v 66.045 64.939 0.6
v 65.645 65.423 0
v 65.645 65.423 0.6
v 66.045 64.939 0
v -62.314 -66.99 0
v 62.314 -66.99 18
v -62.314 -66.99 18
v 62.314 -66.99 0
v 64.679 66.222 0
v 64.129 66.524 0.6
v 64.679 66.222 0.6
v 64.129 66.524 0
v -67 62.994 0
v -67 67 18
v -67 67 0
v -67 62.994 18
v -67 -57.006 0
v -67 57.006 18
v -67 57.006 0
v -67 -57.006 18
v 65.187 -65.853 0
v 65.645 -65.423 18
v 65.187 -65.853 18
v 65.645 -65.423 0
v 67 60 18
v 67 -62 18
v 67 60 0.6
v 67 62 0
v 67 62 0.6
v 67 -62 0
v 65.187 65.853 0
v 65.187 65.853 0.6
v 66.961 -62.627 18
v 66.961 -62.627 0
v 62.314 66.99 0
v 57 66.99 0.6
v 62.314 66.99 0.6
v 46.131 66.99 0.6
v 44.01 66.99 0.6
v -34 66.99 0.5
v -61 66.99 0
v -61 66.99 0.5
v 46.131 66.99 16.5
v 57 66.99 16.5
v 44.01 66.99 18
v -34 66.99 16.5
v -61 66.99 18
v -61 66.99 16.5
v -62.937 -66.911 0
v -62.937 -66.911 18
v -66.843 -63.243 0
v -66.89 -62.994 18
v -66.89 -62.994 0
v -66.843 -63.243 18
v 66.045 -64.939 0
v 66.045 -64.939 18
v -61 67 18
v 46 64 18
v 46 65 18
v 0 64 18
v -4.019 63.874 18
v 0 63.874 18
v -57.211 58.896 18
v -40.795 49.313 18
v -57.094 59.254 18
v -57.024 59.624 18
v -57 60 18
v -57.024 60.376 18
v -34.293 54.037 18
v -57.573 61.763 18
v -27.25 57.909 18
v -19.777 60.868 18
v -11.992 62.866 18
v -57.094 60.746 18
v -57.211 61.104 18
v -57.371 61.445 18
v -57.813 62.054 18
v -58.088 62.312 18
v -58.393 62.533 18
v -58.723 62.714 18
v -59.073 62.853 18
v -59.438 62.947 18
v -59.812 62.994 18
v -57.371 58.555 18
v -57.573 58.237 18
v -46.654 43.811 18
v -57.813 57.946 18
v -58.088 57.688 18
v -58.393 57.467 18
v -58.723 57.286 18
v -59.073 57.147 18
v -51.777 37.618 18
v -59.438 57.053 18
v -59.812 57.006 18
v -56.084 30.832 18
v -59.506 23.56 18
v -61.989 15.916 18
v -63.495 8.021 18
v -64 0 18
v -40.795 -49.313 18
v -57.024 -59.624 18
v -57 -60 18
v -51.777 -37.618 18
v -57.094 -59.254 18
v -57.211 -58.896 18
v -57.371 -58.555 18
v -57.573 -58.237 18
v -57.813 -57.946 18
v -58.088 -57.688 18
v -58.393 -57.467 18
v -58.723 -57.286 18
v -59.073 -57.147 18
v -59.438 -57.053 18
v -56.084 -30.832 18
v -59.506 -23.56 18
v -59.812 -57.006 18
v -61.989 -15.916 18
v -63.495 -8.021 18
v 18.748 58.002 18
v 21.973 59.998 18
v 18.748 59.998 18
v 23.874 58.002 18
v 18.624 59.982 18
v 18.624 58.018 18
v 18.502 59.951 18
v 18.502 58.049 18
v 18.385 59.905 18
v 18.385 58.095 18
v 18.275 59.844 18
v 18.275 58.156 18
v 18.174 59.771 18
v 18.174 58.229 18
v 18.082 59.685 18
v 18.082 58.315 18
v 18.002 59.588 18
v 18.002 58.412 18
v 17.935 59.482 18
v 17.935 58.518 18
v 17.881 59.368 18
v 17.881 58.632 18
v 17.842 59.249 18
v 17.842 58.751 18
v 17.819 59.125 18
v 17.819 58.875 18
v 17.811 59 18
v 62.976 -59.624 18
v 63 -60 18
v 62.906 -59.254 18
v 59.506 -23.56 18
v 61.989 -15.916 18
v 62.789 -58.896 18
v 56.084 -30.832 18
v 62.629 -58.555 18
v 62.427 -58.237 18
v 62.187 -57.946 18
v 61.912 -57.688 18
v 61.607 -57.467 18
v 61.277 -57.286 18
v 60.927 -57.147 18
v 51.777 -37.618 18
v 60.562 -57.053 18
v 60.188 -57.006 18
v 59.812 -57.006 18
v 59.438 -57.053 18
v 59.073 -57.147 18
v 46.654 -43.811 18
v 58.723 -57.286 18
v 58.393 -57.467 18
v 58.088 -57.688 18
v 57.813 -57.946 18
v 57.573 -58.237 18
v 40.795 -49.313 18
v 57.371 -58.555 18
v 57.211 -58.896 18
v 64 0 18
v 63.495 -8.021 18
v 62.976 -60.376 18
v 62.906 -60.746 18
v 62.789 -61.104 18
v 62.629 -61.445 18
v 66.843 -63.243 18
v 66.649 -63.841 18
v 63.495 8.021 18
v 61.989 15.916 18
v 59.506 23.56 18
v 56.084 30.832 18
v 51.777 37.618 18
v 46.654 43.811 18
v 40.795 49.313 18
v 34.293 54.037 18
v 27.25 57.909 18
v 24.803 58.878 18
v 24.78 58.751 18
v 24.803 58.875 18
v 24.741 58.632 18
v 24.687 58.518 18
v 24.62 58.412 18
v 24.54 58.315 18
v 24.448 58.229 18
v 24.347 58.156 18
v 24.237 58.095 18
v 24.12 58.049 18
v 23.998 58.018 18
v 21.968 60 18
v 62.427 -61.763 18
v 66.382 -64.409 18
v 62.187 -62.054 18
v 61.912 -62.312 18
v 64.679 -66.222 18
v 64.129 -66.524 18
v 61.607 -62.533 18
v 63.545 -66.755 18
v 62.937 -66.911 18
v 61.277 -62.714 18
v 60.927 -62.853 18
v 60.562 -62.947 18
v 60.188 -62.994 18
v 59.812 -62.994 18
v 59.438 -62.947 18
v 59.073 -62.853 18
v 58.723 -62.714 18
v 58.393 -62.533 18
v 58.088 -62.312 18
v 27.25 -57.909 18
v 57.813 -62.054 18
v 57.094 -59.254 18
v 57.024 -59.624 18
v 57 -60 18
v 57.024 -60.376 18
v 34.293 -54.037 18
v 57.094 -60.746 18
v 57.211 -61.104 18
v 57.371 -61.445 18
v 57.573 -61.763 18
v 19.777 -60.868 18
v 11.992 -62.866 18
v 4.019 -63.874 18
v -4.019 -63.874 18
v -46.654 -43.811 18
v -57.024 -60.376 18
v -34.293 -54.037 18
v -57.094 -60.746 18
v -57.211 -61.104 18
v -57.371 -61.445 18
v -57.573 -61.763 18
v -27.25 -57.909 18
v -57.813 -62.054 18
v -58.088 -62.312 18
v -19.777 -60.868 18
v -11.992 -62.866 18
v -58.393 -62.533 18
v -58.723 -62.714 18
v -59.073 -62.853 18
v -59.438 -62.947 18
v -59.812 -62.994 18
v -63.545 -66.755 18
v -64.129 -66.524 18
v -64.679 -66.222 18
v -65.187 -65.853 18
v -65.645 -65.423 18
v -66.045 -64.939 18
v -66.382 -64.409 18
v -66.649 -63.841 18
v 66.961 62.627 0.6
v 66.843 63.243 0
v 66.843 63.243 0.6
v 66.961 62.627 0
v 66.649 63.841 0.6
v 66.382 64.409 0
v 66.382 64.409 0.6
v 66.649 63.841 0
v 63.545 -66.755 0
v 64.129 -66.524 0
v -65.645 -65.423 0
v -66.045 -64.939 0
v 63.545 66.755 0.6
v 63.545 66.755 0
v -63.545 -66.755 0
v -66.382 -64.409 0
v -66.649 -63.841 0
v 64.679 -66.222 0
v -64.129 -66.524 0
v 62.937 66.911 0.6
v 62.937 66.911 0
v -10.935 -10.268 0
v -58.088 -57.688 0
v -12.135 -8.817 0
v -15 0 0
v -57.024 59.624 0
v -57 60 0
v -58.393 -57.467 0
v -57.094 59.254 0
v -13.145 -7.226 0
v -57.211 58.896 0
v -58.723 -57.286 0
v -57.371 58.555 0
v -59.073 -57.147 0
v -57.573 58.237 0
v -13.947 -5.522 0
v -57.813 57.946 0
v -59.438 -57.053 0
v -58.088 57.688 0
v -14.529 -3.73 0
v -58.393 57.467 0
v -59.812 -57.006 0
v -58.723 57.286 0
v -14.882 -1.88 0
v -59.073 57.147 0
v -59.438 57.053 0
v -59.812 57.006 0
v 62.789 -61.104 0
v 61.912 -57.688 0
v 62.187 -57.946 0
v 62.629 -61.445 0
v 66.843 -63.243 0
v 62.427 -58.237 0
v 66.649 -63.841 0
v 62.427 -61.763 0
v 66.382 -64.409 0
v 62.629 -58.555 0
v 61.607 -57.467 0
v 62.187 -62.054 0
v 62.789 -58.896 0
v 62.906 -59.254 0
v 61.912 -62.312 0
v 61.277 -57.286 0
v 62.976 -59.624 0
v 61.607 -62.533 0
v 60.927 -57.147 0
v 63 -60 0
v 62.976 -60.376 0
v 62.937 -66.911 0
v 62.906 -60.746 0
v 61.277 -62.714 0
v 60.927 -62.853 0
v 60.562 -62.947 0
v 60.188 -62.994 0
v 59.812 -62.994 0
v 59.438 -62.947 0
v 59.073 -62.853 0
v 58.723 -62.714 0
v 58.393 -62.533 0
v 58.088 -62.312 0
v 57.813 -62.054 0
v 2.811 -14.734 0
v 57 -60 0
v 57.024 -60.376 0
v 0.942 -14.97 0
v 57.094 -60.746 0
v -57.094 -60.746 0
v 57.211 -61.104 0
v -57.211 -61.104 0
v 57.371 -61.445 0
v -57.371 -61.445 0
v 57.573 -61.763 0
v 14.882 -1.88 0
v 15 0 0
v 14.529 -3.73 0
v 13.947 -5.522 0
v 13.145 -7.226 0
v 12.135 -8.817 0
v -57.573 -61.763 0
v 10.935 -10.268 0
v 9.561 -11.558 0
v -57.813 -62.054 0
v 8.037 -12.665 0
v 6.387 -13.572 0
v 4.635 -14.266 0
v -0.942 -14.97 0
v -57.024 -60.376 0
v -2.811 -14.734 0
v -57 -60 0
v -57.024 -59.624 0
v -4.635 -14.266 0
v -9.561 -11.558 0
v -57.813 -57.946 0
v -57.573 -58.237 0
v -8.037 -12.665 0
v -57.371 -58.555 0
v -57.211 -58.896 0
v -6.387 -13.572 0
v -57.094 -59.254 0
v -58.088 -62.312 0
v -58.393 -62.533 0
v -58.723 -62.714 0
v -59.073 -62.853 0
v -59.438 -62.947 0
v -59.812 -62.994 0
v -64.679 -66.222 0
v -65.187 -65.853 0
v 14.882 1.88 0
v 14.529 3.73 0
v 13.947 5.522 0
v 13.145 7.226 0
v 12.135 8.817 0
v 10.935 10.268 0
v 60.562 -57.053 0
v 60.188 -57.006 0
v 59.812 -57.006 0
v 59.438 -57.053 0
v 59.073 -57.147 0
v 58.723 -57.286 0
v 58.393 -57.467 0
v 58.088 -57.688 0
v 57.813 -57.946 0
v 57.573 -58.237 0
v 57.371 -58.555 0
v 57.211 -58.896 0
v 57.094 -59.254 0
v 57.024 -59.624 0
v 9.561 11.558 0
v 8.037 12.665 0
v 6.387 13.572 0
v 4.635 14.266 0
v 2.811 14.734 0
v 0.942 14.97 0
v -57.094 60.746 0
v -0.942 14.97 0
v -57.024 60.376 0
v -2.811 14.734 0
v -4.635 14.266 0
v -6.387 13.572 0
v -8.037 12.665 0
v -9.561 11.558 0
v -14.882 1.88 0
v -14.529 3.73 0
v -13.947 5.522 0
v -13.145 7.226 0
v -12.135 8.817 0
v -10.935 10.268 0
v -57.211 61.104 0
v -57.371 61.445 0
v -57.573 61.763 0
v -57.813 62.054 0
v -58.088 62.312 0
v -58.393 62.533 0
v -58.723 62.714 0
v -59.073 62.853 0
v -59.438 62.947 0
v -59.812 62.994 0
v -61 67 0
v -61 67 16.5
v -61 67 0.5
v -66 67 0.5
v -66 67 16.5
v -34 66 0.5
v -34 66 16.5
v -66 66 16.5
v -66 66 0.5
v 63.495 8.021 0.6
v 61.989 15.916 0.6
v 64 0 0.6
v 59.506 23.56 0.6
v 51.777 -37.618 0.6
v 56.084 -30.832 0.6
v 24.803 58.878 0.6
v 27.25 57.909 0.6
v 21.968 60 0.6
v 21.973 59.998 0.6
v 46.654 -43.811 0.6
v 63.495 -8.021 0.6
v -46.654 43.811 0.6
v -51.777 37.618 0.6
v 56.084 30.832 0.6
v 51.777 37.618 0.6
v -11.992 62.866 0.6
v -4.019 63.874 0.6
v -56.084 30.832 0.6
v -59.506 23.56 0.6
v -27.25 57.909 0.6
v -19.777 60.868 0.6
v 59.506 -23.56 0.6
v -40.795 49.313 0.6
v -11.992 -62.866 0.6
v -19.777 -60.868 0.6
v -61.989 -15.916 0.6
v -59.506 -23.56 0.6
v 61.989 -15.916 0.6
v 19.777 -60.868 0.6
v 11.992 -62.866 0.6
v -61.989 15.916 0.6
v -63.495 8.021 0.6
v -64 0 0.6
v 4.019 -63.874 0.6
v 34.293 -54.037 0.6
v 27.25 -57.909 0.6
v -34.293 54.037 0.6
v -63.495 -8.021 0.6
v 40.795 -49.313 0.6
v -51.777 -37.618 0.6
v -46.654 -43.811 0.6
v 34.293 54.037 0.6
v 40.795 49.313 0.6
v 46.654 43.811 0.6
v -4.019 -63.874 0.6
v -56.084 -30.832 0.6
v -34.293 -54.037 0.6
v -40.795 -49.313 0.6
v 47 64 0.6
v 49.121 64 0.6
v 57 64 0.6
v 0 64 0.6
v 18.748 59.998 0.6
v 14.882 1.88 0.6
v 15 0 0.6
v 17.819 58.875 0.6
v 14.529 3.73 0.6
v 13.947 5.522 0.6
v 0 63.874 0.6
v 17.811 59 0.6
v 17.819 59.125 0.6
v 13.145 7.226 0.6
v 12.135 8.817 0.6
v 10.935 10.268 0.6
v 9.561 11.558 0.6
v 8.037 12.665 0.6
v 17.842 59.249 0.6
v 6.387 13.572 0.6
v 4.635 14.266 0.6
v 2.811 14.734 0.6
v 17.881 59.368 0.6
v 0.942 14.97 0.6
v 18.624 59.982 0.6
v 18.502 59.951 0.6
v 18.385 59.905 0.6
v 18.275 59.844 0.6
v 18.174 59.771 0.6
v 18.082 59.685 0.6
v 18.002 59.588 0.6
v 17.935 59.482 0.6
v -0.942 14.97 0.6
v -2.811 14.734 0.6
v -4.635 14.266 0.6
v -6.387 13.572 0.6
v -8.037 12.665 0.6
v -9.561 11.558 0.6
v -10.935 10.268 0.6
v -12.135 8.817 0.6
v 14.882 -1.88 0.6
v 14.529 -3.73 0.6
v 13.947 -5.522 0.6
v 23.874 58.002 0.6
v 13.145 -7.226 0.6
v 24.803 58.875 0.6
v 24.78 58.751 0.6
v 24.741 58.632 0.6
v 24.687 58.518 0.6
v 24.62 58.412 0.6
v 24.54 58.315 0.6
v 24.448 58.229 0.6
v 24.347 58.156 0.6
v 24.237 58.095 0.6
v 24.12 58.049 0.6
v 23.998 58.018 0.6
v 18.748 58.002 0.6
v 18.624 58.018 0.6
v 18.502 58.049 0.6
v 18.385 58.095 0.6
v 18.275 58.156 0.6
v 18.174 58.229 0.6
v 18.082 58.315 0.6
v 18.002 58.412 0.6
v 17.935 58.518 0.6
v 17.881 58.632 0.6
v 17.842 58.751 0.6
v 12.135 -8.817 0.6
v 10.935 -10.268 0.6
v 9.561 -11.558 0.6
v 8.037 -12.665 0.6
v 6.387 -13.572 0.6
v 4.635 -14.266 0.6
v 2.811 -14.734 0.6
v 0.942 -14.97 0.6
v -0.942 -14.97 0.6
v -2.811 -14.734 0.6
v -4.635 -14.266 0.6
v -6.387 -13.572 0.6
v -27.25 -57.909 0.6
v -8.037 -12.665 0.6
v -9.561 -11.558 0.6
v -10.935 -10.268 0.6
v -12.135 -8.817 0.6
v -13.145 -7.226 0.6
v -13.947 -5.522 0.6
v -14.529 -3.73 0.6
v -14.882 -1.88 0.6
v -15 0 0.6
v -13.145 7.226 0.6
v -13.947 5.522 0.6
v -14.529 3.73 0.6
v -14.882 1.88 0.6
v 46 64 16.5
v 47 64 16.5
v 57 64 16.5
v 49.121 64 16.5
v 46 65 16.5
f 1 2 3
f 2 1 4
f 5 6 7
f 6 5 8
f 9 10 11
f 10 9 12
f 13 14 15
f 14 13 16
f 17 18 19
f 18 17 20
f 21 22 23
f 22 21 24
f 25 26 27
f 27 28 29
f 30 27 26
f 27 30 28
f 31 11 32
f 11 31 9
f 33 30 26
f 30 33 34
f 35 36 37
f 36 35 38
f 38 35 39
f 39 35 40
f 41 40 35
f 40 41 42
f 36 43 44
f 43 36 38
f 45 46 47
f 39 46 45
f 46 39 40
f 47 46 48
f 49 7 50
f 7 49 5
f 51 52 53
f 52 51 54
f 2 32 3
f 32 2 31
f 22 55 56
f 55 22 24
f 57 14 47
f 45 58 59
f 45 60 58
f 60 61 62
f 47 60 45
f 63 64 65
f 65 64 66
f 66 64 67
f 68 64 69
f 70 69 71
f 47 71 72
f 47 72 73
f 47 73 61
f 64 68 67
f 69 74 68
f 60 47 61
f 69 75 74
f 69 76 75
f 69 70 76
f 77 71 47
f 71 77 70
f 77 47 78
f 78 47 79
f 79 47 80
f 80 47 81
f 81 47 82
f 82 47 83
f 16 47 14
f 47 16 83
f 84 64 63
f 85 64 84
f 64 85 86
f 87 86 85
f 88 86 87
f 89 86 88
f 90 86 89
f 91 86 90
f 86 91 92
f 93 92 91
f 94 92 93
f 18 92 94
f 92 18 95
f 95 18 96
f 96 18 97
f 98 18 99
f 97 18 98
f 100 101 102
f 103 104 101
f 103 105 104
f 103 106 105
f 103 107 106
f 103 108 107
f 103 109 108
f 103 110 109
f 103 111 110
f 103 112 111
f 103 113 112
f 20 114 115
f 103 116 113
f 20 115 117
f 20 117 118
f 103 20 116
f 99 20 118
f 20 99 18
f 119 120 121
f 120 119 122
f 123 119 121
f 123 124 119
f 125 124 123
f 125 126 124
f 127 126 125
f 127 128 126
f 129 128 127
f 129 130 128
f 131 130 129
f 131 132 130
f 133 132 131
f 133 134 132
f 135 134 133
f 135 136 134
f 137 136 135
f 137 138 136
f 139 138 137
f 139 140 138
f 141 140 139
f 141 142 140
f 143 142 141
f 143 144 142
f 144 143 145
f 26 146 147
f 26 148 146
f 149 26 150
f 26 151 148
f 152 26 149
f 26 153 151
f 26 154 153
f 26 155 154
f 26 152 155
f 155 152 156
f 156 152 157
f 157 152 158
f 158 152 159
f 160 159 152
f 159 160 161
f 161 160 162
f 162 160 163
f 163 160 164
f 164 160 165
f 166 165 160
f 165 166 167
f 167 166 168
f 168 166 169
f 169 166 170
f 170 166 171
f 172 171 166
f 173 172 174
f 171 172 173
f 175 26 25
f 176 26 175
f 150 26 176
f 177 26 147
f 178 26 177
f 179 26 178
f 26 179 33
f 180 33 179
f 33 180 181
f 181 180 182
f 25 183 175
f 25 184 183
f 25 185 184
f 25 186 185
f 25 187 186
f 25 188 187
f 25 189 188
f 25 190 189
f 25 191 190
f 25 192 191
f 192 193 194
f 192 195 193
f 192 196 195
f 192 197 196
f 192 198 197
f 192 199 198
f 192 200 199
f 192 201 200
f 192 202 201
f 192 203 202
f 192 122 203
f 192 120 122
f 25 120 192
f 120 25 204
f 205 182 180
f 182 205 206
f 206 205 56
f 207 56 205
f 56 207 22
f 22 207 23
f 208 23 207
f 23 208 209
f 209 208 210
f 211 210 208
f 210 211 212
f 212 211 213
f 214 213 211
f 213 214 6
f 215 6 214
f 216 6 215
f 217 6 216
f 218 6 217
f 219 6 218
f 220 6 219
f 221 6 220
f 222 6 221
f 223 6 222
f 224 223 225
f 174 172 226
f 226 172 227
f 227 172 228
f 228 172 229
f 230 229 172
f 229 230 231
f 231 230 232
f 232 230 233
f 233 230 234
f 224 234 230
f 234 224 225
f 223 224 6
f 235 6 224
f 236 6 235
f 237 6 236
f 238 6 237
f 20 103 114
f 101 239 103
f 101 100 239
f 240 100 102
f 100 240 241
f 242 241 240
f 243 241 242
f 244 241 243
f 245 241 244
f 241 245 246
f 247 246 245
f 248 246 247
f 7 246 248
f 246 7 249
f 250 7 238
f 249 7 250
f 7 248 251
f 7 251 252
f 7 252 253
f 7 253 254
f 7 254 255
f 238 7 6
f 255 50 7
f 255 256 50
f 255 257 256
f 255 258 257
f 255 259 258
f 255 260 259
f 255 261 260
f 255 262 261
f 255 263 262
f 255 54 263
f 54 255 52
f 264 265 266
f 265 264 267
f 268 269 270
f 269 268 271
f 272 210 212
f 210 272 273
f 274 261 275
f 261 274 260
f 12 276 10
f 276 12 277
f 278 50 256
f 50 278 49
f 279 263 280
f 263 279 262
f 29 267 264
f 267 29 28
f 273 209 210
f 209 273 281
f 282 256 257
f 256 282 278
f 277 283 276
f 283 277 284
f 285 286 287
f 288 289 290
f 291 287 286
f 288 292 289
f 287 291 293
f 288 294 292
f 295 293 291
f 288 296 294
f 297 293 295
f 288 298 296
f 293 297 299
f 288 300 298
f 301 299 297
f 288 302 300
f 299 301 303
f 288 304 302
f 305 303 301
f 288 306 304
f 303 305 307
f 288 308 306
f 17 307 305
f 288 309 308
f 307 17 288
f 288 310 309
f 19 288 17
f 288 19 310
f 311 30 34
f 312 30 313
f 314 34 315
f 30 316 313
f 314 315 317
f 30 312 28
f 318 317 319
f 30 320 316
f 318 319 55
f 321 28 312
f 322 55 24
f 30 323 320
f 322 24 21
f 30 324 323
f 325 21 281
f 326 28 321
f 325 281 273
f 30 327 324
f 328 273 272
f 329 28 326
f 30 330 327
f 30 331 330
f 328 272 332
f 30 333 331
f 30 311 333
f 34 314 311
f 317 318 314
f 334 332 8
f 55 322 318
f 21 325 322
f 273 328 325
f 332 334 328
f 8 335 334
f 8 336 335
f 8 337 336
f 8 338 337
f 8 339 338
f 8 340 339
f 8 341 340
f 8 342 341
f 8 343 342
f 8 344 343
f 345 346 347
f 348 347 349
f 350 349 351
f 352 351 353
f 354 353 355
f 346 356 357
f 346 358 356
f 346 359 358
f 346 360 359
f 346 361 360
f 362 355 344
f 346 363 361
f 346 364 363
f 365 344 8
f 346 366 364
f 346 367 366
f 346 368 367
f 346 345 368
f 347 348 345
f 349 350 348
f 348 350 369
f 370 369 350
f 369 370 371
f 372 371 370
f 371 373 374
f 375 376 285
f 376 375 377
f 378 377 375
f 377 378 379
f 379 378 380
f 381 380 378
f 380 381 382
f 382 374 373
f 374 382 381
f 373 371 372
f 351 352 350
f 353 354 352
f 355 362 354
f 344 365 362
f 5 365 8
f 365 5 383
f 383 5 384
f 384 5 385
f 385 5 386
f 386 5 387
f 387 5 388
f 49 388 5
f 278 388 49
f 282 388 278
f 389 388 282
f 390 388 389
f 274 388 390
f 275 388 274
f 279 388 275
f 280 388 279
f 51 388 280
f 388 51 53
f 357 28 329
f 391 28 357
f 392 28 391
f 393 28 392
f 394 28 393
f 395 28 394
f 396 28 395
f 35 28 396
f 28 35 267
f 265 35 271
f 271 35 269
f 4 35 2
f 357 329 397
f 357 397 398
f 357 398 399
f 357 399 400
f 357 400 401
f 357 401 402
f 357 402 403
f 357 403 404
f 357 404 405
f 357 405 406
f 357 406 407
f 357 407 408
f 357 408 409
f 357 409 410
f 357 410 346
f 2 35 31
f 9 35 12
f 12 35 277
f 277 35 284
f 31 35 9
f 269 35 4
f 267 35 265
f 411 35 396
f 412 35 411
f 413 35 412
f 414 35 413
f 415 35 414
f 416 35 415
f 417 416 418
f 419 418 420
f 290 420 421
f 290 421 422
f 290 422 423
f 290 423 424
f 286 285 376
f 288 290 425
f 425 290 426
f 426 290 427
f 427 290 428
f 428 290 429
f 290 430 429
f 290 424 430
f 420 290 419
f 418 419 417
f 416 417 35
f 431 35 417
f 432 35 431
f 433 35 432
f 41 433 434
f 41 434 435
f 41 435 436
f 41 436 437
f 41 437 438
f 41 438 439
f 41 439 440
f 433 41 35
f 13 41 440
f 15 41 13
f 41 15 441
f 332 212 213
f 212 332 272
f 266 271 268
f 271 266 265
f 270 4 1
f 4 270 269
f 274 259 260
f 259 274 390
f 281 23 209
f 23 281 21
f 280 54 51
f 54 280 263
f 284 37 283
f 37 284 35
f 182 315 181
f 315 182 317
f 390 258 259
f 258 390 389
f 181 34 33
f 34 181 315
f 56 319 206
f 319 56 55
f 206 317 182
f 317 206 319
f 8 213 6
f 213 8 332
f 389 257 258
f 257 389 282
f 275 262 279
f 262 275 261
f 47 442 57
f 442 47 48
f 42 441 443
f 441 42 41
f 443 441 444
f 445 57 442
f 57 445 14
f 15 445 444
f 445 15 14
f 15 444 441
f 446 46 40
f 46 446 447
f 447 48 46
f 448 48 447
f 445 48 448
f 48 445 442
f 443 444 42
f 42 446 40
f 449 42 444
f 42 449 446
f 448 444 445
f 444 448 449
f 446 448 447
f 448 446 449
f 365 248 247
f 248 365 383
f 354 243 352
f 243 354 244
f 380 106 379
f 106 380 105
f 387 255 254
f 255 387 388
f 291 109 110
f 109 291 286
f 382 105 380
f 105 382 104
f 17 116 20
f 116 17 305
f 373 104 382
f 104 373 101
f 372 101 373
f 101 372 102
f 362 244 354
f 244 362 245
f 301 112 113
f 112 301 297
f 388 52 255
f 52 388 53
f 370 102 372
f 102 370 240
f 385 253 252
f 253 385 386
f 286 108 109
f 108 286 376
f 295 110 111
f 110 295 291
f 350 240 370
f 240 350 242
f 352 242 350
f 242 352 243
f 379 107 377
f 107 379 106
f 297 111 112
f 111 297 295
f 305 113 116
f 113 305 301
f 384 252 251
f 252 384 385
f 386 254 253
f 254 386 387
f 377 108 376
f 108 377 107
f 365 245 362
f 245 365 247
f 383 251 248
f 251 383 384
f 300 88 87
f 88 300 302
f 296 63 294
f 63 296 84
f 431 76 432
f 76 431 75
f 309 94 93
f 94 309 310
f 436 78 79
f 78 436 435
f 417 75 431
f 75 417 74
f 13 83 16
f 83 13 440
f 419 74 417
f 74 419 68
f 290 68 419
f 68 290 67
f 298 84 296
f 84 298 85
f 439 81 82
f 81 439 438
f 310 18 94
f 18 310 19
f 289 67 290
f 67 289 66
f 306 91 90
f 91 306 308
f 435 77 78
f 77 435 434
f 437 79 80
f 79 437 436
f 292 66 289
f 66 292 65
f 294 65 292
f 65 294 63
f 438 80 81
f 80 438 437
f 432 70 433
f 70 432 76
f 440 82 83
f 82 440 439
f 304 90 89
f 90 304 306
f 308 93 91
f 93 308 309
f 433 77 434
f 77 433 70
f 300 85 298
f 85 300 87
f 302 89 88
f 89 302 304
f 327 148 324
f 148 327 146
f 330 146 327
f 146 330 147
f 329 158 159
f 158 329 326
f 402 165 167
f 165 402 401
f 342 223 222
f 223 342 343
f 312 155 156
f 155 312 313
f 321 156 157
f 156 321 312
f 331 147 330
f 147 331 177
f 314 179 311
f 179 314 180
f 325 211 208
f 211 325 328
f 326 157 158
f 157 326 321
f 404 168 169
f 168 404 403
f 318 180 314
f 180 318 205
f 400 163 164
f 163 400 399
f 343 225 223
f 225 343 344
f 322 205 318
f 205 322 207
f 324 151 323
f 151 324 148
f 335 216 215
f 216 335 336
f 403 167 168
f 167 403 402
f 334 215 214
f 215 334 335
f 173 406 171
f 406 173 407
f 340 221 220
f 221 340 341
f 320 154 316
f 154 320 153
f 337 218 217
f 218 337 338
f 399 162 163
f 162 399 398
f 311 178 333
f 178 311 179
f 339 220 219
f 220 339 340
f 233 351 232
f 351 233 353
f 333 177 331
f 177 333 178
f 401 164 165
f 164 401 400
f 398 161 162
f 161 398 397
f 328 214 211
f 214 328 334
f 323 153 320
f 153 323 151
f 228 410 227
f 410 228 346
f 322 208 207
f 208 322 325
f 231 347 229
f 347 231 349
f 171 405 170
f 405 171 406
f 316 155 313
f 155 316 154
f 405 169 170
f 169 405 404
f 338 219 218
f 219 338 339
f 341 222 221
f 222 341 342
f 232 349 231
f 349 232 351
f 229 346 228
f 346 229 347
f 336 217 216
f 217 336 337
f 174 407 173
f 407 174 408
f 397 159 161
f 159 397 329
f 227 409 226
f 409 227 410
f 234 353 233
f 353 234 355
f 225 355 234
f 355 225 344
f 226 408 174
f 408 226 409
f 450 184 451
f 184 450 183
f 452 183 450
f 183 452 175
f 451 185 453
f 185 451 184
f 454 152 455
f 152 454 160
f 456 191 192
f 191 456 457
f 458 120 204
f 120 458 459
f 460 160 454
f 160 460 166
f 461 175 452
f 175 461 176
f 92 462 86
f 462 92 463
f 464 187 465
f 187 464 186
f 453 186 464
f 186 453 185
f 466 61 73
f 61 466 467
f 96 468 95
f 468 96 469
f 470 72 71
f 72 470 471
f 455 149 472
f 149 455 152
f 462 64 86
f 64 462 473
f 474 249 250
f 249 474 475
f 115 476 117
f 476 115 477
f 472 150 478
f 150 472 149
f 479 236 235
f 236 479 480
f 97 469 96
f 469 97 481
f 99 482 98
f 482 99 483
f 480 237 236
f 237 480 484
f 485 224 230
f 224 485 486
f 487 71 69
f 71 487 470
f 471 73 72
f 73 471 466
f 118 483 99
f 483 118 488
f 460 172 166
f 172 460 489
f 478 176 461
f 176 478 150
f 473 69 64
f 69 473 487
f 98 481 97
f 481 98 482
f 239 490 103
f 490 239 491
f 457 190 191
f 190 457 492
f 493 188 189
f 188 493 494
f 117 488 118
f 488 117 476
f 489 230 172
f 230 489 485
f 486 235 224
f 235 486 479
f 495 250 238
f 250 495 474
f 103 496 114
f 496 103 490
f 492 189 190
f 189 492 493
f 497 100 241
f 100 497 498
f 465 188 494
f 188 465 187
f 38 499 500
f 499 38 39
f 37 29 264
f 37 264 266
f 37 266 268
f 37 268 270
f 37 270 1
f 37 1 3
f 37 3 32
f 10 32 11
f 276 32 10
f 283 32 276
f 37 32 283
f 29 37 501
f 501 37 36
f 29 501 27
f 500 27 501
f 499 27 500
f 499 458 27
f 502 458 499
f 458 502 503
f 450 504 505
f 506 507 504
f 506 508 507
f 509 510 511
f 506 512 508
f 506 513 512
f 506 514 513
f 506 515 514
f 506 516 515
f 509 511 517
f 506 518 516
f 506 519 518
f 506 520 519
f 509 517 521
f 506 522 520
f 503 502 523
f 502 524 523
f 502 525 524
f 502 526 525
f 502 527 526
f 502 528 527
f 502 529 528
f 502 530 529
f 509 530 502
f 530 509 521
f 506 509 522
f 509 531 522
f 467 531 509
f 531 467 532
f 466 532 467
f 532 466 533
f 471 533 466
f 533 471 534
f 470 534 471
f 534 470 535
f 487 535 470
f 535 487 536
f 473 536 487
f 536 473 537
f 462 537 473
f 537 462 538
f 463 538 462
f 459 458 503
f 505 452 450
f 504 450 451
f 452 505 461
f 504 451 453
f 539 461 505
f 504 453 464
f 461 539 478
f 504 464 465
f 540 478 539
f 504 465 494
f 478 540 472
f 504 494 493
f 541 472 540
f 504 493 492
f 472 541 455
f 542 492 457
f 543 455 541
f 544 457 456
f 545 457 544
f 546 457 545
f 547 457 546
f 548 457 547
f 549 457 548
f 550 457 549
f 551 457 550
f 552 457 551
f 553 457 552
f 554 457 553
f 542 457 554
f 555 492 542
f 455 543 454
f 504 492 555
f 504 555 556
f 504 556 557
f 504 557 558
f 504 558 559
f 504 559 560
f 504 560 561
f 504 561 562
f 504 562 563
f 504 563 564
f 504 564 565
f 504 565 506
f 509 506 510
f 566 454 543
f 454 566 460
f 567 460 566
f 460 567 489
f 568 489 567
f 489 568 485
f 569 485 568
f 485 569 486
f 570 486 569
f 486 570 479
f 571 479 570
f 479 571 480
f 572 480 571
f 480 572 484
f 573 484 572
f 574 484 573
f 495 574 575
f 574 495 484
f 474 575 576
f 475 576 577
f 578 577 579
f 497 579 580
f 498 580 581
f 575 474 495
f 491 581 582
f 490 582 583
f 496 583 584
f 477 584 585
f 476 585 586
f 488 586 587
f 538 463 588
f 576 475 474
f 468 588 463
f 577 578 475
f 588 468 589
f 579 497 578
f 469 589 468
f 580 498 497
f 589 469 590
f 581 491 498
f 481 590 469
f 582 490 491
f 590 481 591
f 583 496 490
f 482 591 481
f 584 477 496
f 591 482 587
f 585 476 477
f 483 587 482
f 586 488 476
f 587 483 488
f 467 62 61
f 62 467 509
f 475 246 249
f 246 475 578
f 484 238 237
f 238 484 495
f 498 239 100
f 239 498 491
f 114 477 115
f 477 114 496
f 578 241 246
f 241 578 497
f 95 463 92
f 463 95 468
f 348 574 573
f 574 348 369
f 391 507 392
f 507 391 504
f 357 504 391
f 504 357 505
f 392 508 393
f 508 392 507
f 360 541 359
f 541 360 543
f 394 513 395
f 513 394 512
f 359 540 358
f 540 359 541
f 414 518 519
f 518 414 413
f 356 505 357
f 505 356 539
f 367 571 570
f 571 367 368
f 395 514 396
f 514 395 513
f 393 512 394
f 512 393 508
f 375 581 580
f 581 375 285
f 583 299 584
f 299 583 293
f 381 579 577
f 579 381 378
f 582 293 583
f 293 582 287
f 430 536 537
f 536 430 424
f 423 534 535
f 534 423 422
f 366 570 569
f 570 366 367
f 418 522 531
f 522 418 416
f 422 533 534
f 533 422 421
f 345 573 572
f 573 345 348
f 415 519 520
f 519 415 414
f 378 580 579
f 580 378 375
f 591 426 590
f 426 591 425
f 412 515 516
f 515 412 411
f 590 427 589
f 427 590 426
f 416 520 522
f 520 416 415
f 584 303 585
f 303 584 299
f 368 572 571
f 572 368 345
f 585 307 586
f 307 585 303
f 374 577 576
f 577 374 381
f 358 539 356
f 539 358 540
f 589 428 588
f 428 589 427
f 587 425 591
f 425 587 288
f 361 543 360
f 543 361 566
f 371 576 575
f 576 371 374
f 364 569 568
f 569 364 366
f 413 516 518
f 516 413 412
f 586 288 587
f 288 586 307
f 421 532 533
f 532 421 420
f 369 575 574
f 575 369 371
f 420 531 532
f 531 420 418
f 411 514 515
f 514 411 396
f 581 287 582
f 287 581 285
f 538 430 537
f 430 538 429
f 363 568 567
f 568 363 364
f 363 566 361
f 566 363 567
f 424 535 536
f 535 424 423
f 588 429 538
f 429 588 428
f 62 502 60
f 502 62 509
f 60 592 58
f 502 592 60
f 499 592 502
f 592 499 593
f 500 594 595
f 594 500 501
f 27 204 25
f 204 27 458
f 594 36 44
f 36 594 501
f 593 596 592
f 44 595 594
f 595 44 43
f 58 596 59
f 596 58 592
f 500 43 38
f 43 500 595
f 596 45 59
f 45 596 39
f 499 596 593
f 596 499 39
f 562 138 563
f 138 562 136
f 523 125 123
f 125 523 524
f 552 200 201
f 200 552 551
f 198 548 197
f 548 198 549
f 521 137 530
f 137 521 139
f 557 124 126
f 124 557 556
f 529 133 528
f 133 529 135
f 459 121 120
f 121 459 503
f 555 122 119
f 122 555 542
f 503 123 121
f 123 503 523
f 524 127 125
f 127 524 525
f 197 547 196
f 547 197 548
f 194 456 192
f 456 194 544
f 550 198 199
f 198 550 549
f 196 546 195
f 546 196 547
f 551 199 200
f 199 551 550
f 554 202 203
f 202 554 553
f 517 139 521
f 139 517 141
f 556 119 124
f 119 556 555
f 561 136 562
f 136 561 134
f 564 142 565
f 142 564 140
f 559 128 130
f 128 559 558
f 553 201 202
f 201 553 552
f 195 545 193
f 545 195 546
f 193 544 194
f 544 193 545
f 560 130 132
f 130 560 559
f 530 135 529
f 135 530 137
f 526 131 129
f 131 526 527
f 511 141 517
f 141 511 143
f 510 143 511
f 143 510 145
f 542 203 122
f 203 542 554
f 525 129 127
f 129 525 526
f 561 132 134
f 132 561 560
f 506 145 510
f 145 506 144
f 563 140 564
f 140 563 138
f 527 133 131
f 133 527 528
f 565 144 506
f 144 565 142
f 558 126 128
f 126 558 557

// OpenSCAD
$fn = 50;


union() {
	difference() {
		union() {
			translate(v = [0, 0, 0]) {
				rotate(a = [0, 0, 0]) {
					hull() {
						translate(v = [-62.0000000000, 62.0000000000, 0]) {
							rotate(a = [0, 0, 0]) {
								translate(v = [0, 0, 0]) {
									rotate(a = [0, 0, 0]) {
										cylinder(h = 18, r = 5);
									}
								}
							}
						}
						translate(v = [62.0000000000, 62.0000000000, 0]) {
							rotate(a = [0, 0, 0]) {
								translate(v = [0, 0, 0]) {
									rotate(a = [0, 0, 0]) {
										cylinder(h = 18, r = 5);
									}
								}
							}
						}
						translate(v = [-62.0000000000, -62.0000000000, 0]) {
							rotate(a = [0, 0, 0]) {
								translate(v = [0, 0, 0]) {
									rotate(a = [0, 0, 0]) {
										cylinder(h = 18, r = 5);
									}
								}
							}
						}
						translate(v = [62.0000000000, -62.0000000000, 0]) {
							rotate(a = [0, 0, 0]) {
								translate(v = [0, 0, 0]) {
									rotate(a = [0, 0, 0]) {
										cylinder(h = 18, r = 5);
									}
								}
							}
						}
					}
				}
			}
			translate(v = [-67.0000000000, 61.0000000000, 0]) {
				rotate(a = [0, 0, 0]) {
					cube(size = [6, 6, 18]);
				}
			}
		}
		union() {
			#translate(v = [-66.0000000000, 66.0000000000, 0.5000000000]) {
				rotate(a = [0, 0, 0]) {
					cube(size = [32, 1, 16]);
				}
			}
			translate(v = [-67.5000000000, -60.0000000000, -125]) {
				rotate(a = [0, 0, 0]) {
					hull() {
						translate(v = [7.5000000000, 0, 0]) {
							rotate(a = [0, 0, 0]) {
								translate(v = [0, 0, 0]) {
									rotate(a = [0, 0, 0]) {
										cylinder(h = 250, r = 3.0000000000);
									}
								}
							}
						}
						translate(v = [-7.5000000000, 0, 0]) {
							rotate(a = [0, 0, 0]) {
								translate(v = [0, 0, 0]) {
									rotate(a = [0, 0, 0]) {
										cylinder(h = 250, r = 3.0000000000);
									}
								}
							}
						}
					}
				}
			}
			translate(v = [-67.5000000000, 60.0000000000, -125]) {
				rotate(a = [0, 0, 0]) {
					hull() {
						translate(v = [7.5000000000, 0, 0]) {
							rotate(a = [0, 0, 0]) {
								translate(v = [0, 0, 0]) {
									rotate(a = [0, 0, 0]) {
										cylinder(h = 250, r = 3.0000000000);
									}
								}
							}
						}
						translate(v = [-7.5000000000, 0, 0]) {
							rotate(a = [0, 0, 0]) {
								translate(v = [0, 0, 0]) {
									rotate(a = [0, 0, 0]) {
										cylinder(h = 250, r = 3.0000000000);
									}
								}
							}
						}
					}
				}
			}
			translate(v = [60.0000000000, -60.0000000000, -125.0000000000]) {
				rotate(a = [0, 0, 0]) {
					cylinder(h = 250, r = 3.0000000000);
				}
			}
			translate(v = [0, 0, 0.6000000000]) {
				rotate(a = [0, 0, 0]) {
					cylinder(h = 20.4000000000, r = 64.0000000000);
				}
			}
			translate(v = [0, 0, -9.0000000000]) {
				rotate(a = [0, 0, 0]) {
					cylinder(h = 18, r = 15.0000000000);
				}
			}
			translate(v = [0.0000000000, 60.0000000000, 0.6000000000]) {
				rotate(a = [0, 0, 0]) {
					cube(size = [67.0000000000, 4, 20.4000000000]);
				}
			}
			translate(v = [57.0000000000, 60.0000000000, 0.6000000000]) {
				rotate(a = [0, 0, 0]) {
					cube(size = [10, 7, 20.4000000000]);
				}
			}
			translate(v = [46.0000000000, 60.0000000000, 16.5000000000]) {
				rotate(a = [0, 0, 0]) {
					cube(size = [21, 7, 1.5000000000]);
				}
			}
			translate(v = [43.2500000000, 67.7500000000, 0.6000000000]) {
				rotate(a = [0, 0, -45]) {
					cube(size = [7.5000000000, 1.5000000000, 20.4000000000]);
				}
			}
			translate(v = [12.0610000000, 58.0000000000, 0.6000000000]) {
				rotate(a = [0, 0, 0]) {
					cube(size = [7.5000000000, 2, 17.4000000000]);
				}
			}
		}
	}
	union() {
		translate(v = [21.3110000000, 59.0000000000, 0]) {
			rotate(a = [0, 0, 0]) {
				hull() {
					translate(v = [2.5000000000, 0, 0]) {
						rotate(a = [0, 0, 0]) {
							#translate(v = [0, 0, 0]) {
								rotate(a = [0, 0, 0]) {
									cylinder(h = 18, r = 1.0000000000);
								}
							}
						}
					}
					translate(v = [-2.5000000000, 0, 0]) {
						rotate(a = [0, 0, 0]) {
							#translate(v = [0, 0, 0]) {
								rotate(a = [0, 0, 0]) {
									cylinder(h = 18, r = 1.0000000000);
								}
							}
						}
					}
				}
			}
		}
	}
}
